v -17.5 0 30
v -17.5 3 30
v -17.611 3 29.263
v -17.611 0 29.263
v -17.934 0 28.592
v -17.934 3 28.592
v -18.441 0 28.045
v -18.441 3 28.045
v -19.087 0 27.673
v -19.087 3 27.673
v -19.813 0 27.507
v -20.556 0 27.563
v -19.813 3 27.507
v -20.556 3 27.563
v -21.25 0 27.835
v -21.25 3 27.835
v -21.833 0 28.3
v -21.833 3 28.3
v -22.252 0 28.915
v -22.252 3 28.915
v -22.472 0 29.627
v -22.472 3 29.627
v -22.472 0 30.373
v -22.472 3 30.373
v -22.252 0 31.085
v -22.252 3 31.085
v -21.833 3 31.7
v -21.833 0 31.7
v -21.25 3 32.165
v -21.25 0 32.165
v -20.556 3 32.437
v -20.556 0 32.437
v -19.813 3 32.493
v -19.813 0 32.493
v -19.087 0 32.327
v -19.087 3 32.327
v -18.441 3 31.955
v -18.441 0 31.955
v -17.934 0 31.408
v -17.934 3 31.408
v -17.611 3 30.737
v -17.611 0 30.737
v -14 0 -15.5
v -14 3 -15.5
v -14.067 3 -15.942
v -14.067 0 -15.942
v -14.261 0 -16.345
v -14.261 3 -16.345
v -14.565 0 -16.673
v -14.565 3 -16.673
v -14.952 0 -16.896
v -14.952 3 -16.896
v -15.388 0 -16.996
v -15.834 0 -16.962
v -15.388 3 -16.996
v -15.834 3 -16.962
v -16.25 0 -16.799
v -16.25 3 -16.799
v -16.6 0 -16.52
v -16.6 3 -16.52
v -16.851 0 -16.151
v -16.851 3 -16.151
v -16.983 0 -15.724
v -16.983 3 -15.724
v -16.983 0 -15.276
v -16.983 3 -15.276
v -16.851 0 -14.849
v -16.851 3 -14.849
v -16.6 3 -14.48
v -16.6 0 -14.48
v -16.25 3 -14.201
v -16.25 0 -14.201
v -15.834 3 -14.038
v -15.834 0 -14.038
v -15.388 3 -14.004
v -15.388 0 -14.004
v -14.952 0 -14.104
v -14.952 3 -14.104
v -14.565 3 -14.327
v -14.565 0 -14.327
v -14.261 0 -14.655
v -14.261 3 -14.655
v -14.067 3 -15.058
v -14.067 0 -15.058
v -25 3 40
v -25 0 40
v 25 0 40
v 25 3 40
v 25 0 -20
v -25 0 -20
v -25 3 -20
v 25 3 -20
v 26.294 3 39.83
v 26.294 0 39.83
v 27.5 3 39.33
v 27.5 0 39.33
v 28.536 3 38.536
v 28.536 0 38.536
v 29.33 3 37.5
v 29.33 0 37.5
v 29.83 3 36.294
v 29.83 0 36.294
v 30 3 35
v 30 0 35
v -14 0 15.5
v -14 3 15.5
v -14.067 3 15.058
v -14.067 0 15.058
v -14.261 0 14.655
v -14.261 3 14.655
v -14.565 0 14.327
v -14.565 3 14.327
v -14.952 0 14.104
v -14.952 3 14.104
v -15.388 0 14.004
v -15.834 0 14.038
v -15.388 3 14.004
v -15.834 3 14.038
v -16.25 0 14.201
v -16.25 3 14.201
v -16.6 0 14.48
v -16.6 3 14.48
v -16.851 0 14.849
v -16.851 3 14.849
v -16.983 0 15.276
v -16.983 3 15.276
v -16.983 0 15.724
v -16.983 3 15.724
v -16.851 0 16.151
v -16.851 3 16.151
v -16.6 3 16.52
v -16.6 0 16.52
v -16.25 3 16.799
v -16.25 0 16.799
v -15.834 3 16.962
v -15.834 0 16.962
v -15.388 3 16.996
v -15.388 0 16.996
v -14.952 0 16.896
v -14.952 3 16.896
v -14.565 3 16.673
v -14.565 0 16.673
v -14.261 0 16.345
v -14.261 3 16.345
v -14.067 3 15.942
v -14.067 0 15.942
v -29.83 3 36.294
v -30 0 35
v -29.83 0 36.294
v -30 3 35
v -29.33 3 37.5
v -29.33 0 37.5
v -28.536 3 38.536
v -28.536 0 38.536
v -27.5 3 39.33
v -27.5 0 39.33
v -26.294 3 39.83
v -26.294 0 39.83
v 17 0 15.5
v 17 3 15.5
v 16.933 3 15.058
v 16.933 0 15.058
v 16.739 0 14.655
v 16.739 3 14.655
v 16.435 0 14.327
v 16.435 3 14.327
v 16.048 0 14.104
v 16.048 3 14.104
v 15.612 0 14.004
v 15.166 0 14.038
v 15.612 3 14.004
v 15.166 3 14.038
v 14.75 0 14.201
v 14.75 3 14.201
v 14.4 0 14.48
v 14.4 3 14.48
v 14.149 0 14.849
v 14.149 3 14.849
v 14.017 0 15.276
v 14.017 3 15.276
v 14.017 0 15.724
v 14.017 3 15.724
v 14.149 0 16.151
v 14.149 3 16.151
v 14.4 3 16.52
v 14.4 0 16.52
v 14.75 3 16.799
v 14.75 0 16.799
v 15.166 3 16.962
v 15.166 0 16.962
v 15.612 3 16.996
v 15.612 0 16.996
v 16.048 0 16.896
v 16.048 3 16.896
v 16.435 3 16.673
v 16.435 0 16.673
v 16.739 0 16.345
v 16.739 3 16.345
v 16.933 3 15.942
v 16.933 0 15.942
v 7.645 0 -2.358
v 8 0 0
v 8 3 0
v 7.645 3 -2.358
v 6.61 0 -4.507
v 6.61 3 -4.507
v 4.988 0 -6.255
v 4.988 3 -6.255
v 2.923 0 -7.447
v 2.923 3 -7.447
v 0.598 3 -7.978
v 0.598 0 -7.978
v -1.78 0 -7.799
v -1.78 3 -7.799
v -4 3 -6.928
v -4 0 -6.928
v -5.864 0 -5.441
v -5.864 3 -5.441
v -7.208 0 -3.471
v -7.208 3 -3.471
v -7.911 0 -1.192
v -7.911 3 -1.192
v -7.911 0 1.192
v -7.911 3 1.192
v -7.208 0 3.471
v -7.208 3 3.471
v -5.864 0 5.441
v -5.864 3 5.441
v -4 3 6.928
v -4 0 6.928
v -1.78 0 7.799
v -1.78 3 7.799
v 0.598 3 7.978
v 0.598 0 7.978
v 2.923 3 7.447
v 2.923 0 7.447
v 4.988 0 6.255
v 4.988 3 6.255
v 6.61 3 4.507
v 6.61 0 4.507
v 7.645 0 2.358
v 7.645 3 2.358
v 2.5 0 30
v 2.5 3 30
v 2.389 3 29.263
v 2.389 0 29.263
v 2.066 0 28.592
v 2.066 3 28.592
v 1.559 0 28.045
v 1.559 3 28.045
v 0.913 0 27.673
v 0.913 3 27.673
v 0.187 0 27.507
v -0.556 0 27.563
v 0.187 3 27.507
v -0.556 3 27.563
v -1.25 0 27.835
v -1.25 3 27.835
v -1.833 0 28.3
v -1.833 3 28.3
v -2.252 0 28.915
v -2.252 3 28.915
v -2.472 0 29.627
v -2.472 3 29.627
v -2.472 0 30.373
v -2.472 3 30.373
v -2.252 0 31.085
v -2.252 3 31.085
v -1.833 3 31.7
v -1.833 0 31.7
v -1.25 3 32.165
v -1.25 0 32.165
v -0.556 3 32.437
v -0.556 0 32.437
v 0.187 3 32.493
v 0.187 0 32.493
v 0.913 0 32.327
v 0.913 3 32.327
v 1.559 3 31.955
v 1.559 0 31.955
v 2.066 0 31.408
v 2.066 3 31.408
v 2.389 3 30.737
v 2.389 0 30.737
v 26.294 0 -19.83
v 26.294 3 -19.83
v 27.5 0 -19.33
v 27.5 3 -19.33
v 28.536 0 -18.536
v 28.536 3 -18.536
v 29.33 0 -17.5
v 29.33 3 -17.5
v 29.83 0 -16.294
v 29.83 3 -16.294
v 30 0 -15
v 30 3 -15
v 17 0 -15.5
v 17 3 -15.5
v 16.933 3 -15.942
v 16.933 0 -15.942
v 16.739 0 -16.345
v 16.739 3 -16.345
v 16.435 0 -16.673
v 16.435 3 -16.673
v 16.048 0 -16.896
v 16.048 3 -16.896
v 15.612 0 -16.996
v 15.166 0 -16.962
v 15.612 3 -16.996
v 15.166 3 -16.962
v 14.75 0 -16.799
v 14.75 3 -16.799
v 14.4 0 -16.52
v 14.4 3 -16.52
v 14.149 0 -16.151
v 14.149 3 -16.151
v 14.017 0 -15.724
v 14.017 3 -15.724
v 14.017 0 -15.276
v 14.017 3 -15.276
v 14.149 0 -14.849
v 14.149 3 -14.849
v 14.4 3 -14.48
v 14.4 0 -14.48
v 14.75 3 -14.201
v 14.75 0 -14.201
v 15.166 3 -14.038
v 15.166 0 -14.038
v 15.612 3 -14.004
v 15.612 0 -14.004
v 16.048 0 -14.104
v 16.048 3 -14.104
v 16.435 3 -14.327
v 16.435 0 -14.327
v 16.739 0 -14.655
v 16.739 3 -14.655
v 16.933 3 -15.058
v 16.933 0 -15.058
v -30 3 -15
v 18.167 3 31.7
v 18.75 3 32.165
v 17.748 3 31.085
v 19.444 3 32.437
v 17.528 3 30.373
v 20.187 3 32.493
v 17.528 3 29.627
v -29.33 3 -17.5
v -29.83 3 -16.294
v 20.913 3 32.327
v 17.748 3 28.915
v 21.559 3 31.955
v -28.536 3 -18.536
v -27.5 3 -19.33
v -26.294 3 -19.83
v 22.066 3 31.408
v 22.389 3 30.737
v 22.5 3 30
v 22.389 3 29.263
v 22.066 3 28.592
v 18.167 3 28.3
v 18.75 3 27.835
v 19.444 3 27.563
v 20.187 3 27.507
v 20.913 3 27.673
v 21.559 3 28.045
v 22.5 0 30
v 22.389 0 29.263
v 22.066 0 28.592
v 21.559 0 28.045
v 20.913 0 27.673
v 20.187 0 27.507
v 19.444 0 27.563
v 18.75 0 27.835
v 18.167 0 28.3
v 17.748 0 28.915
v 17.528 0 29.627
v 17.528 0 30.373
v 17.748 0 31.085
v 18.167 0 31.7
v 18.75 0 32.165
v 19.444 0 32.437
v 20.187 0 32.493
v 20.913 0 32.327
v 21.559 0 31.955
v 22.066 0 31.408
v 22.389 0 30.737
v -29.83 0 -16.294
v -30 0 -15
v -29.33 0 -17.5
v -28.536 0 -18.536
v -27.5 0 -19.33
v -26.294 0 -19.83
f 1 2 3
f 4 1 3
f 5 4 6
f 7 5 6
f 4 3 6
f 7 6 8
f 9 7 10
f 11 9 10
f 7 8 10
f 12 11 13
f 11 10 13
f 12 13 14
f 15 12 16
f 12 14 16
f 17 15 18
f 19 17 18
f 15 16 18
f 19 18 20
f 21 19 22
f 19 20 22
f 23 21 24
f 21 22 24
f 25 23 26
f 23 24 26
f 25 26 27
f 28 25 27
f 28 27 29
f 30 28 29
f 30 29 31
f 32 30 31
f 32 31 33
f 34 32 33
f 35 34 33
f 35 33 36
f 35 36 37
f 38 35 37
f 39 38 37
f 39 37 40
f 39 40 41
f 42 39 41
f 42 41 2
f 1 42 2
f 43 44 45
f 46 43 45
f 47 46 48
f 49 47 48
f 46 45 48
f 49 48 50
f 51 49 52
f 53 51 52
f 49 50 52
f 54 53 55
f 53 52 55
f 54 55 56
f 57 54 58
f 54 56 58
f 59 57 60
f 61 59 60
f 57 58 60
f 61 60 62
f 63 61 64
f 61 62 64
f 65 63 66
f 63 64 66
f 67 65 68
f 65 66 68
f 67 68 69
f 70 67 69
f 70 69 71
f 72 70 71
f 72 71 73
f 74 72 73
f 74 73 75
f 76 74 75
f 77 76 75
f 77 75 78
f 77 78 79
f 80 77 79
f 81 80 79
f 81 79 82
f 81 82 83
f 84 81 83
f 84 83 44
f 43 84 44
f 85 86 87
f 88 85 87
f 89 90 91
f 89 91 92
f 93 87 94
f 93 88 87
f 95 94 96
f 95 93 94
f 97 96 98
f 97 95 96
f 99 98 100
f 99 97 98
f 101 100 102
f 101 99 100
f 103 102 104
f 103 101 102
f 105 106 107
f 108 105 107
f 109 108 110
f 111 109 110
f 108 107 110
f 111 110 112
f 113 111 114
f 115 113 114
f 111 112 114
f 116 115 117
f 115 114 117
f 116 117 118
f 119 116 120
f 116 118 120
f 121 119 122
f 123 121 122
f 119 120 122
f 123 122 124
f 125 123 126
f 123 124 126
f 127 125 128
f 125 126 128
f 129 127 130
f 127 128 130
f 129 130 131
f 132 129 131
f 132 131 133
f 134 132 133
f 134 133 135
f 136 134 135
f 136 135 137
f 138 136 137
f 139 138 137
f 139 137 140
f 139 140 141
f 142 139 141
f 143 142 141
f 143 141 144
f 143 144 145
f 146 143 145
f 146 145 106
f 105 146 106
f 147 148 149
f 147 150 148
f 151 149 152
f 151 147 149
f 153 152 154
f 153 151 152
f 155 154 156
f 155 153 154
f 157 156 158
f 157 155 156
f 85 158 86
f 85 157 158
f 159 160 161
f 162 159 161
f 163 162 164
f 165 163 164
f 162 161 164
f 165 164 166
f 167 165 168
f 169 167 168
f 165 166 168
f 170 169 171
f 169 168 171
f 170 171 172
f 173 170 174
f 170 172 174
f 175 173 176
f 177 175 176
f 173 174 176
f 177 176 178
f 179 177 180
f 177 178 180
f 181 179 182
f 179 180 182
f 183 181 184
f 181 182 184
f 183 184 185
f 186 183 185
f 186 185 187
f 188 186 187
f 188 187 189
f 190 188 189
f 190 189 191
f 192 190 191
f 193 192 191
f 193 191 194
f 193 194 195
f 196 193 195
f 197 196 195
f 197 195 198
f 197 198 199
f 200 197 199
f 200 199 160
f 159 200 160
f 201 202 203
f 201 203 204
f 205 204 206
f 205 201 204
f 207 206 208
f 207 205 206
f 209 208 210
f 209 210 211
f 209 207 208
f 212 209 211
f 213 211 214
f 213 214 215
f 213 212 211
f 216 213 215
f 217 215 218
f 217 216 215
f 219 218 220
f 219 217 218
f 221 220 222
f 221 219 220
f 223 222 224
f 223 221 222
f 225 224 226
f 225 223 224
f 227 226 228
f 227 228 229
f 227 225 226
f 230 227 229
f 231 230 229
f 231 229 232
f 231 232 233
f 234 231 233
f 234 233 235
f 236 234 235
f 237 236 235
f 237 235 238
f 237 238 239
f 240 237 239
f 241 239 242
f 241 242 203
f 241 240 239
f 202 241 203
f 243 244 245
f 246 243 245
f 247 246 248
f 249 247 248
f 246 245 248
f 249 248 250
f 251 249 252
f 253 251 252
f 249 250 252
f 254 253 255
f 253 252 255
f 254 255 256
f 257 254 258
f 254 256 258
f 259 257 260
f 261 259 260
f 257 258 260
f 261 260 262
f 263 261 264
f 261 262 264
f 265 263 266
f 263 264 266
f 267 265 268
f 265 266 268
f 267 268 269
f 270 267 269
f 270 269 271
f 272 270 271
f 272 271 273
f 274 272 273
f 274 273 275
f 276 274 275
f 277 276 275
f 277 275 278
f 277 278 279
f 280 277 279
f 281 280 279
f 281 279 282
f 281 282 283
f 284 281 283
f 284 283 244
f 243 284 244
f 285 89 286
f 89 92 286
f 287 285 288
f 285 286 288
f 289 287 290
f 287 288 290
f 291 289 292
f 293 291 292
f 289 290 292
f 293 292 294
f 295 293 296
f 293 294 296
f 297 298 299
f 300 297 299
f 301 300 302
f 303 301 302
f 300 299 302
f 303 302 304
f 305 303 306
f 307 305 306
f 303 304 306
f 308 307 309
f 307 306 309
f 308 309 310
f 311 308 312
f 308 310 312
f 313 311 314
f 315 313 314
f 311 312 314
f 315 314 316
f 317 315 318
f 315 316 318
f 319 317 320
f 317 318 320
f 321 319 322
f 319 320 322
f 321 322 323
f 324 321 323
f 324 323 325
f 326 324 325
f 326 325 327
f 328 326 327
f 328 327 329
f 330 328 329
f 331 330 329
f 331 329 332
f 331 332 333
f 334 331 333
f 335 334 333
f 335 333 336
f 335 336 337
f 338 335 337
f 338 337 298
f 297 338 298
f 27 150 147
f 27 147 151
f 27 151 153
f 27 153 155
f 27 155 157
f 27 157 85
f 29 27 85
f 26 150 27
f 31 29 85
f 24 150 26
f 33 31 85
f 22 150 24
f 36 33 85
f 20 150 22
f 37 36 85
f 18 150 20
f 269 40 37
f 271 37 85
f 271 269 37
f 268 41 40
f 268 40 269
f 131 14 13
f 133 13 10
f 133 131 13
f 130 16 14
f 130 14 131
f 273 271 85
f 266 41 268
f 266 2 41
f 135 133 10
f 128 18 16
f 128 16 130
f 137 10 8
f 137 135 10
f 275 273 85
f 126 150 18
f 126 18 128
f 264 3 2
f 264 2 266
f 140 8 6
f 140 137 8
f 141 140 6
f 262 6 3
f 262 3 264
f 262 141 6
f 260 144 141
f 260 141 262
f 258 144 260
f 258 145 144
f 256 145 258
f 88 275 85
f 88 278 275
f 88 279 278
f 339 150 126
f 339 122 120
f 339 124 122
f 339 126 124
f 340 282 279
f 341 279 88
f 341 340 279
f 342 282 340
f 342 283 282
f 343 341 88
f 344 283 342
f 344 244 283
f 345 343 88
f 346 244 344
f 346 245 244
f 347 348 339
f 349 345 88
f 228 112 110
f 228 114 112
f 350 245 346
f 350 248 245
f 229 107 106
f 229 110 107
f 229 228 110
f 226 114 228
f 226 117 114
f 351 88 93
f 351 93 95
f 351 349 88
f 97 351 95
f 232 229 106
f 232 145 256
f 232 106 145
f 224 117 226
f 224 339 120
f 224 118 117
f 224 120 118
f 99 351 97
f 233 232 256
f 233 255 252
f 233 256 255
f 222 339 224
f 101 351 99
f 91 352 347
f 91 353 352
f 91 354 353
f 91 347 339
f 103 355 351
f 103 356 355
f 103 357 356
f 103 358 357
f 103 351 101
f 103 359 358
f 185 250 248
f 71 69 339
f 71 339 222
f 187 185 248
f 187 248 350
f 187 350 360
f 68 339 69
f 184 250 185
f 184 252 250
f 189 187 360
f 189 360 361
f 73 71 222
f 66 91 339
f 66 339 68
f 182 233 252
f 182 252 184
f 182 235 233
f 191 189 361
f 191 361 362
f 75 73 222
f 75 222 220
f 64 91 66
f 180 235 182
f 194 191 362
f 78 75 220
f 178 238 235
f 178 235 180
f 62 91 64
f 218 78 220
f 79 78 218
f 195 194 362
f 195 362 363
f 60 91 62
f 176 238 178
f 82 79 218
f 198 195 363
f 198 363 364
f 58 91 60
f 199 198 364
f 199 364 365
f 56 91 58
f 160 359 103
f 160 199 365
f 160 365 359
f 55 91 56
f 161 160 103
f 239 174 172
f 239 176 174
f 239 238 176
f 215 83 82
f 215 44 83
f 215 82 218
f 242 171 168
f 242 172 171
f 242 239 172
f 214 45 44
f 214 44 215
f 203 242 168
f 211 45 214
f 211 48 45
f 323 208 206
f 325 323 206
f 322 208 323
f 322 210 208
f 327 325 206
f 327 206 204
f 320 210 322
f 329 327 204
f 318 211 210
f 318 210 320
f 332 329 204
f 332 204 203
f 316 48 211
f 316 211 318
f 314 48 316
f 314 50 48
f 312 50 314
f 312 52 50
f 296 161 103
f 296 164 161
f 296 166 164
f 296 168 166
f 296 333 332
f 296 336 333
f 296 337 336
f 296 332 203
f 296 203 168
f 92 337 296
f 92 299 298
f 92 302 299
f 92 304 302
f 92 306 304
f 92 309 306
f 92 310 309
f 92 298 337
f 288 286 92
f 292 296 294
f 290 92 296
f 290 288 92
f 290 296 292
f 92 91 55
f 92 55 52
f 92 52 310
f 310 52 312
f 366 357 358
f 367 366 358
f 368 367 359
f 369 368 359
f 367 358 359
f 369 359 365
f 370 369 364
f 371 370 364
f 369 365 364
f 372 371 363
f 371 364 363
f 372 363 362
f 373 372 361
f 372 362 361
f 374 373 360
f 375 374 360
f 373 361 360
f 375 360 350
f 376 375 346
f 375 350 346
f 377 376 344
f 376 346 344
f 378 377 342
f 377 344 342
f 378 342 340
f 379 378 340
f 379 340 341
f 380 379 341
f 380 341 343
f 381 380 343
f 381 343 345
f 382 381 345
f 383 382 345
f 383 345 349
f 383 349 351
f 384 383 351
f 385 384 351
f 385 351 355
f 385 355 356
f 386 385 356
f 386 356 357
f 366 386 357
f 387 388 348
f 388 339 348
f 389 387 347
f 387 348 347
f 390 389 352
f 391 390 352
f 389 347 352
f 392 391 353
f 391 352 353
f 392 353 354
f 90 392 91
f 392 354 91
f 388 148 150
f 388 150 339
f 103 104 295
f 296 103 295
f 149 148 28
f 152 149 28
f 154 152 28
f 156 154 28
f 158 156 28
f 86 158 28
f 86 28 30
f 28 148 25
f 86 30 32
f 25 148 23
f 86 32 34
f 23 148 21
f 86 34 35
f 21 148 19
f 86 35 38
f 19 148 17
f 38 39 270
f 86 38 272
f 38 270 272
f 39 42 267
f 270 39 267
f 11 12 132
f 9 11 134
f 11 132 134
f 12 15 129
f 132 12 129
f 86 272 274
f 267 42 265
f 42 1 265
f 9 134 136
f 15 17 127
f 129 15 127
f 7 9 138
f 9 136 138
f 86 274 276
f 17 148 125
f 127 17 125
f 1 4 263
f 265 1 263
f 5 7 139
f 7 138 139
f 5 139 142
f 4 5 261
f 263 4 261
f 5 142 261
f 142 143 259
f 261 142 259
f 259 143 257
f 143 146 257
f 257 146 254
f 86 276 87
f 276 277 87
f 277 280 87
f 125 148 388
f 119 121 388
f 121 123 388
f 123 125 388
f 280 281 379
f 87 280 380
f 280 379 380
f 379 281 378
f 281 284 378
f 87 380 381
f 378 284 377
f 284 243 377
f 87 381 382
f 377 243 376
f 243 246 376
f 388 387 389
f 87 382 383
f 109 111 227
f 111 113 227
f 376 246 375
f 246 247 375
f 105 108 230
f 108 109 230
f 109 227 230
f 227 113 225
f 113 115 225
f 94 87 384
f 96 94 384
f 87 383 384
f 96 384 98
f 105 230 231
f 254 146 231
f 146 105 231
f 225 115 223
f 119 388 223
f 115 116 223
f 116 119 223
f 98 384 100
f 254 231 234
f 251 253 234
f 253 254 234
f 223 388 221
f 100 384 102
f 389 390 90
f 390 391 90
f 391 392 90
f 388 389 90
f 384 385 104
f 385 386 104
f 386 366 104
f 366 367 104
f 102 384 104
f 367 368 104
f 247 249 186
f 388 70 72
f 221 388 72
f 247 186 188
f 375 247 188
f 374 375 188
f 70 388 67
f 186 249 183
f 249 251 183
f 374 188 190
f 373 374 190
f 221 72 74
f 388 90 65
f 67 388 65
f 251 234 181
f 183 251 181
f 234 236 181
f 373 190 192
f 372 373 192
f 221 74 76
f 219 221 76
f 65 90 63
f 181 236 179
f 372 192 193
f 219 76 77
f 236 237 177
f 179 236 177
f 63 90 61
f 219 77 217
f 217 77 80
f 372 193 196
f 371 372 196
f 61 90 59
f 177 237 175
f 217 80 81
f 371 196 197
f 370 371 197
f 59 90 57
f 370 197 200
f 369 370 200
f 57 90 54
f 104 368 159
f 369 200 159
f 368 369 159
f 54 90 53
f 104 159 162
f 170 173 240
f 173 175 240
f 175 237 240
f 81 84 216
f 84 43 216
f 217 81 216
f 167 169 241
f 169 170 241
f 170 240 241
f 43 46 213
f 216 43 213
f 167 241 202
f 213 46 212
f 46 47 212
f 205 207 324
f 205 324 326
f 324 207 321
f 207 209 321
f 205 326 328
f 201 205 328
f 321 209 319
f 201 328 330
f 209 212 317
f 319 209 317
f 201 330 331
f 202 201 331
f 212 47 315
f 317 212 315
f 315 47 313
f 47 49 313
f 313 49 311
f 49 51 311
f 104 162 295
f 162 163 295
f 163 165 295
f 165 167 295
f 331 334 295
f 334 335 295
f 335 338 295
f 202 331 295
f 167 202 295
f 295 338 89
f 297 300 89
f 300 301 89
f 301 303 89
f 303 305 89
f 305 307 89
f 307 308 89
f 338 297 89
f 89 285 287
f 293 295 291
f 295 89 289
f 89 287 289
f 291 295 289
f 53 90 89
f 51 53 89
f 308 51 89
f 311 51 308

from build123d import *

# Parameters (mm, degrees)
SKETCH1_W            = 60
SKETCH1_H            = 60
SKETCH1_R            = 8
BOSS_EXTRUDE1_DEPTH  = 3
SKETCH2_R            = 1.5
CUT_EXTRUDE1_DEPTH   = 4
LPATTERN1_COUNT      = 2
LPATTERN1_PITCH      = 31
LPATTERN1_COUNT_DIR2 = 2
LPATTERN1_PITCH_DIR2 = 31
SKETCH3_R            = 2.5
CUT_EXTRUDE2_DEPTH   = 4
LPATTERN2_COUNT      = 3
LPATTERN2_PITCH      = 20
FILLET1_R            = 5


with BuildPart() as part:
    # Sketch1 → Boss-Extrude1 (new body)
    with BuildSketch(Plane(origin=(0, 0, 0), x_dir=(1, 0, 0), z_dir=(0, 1, 0))):
        with Locations((0, -10)):
            Rectangle(SKETCH1_W, SKETCH1_H)
        Circle(SKETCH1_R, mode=Mode.SUBTRACT)
    extrude(amount=BOSS_EXTRUDE1_DEPTH)

    # Sketch2 → Cut-Extrude1 (cut, through all)
    with BuildSketch(Plane(origin=(0, 3, 0), x_dir=(1, 0, 0), z_dir=(0, 1, 0))):
        with Locations((-15.5, 15.5)):
            Circle(SKETCH2_R)
    cut_extrude1 = extrude(amount=-CUT_EXTRUDE1_DEPTH, mode=Mode.SUBTRACT)

    # LPattern1: Cut-Extrude1 2 × 2
    with Locations(*[(i * LPATTERN1_PITCH, 0, j * LPATTERN1_PITCH_DIR2) for i in range(LPATTERN1_COUNT) for j in range(LPATTERN1_COUNT_DIR2) if (i, j) != (0, 0)]):
        add(cut_extrude1, mode=Mode.SUBTRACT)

    # Sketch3 → Cut-Extrude2 (cut, through all)
    with BuildSketch(Plane(origin=(0, 3, 0), x_dir=(1, 0, 0), z_dir=(0, 1, 0))):
        with Locations((-20, -30)):
            Circle(SKETCH3_R)
    cut_extrude2 = extrude(amount=-CUT_EXTRUDE2_DEPTH, mode=Mode.SUBTRACT)

    # LPattern2: Cut-Extrude2 ×3
    with Locations(*[(i * LPATTERN2_PITCH, 0, 0) for i in range(1, LPATTERN2_COUNT)]):
        add(cut_extrude2, mode=Mode.SUBTRACT)

    # Fillet1
    fillet1_edges = [part.edges().sort_by_distance(p)[0] for p in [
        (-30, 1.5, 40),
        (-30, 1.5, -20),
        (30, 1.5, -20),
        (30, 1.5, 40),
    ]]
    fillet(fillet1_edges, radius=FILLET1_R)


solid = part.part
